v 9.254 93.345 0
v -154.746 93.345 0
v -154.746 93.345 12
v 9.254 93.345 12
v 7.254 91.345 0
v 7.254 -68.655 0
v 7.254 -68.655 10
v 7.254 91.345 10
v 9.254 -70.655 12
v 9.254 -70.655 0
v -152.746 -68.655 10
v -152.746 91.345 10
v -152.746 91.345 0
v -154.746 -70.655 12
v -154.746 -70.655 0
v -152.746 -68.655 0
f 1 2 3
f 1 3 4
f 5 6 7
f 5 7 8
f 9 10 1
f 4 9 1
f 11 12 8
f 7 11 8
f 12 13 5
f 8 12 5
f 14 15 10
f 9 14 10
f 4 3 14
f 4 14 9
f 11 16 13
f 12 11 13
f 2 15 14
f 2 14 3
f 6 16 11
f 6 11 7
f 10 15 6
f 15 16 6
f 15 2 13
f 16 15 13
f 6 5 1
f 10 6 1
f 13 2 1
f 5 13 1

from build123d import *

# Parameters (mm, degrees)
SKETCH_2_W      = 164
SKETCH_2_H      = 164
EXTRUDE_1_DEPTH = 12
SKETCH_1_W      = 160
SKETCH_1_H      = 160
EXTRUDE_2_DEPTH = 10


with BuildPart() as part:
    # 草图2 → 凸台-拉伸1 (new body)
    with BuildSketch(Plane.XY):
        with Locations((-72.7457284, 11.344743276)):
            Rectangle(SKETCH_2_W, SKETCH_2_H)
    extrude(amount=EXTRUDE_1_DEPTH)


with BuildPart() as body_2:
    # 草图1 → 凸台-拉伸2 (new body)
    with BuildSketch(Plane.XY):
        with Locations((-72.7457284, 11.344743276)):
            Rectangle(SKETCH_1_W, SKETCH_1_H)
    extrude(amount=EXTRUDE_2_DEPTH)


with BuildPart() as part_1:
    add(part.part)

    # Combine 1: cut body 2
    add(body_2.part, mode=Mode.SUBTRACT)


solid = part_1.part
